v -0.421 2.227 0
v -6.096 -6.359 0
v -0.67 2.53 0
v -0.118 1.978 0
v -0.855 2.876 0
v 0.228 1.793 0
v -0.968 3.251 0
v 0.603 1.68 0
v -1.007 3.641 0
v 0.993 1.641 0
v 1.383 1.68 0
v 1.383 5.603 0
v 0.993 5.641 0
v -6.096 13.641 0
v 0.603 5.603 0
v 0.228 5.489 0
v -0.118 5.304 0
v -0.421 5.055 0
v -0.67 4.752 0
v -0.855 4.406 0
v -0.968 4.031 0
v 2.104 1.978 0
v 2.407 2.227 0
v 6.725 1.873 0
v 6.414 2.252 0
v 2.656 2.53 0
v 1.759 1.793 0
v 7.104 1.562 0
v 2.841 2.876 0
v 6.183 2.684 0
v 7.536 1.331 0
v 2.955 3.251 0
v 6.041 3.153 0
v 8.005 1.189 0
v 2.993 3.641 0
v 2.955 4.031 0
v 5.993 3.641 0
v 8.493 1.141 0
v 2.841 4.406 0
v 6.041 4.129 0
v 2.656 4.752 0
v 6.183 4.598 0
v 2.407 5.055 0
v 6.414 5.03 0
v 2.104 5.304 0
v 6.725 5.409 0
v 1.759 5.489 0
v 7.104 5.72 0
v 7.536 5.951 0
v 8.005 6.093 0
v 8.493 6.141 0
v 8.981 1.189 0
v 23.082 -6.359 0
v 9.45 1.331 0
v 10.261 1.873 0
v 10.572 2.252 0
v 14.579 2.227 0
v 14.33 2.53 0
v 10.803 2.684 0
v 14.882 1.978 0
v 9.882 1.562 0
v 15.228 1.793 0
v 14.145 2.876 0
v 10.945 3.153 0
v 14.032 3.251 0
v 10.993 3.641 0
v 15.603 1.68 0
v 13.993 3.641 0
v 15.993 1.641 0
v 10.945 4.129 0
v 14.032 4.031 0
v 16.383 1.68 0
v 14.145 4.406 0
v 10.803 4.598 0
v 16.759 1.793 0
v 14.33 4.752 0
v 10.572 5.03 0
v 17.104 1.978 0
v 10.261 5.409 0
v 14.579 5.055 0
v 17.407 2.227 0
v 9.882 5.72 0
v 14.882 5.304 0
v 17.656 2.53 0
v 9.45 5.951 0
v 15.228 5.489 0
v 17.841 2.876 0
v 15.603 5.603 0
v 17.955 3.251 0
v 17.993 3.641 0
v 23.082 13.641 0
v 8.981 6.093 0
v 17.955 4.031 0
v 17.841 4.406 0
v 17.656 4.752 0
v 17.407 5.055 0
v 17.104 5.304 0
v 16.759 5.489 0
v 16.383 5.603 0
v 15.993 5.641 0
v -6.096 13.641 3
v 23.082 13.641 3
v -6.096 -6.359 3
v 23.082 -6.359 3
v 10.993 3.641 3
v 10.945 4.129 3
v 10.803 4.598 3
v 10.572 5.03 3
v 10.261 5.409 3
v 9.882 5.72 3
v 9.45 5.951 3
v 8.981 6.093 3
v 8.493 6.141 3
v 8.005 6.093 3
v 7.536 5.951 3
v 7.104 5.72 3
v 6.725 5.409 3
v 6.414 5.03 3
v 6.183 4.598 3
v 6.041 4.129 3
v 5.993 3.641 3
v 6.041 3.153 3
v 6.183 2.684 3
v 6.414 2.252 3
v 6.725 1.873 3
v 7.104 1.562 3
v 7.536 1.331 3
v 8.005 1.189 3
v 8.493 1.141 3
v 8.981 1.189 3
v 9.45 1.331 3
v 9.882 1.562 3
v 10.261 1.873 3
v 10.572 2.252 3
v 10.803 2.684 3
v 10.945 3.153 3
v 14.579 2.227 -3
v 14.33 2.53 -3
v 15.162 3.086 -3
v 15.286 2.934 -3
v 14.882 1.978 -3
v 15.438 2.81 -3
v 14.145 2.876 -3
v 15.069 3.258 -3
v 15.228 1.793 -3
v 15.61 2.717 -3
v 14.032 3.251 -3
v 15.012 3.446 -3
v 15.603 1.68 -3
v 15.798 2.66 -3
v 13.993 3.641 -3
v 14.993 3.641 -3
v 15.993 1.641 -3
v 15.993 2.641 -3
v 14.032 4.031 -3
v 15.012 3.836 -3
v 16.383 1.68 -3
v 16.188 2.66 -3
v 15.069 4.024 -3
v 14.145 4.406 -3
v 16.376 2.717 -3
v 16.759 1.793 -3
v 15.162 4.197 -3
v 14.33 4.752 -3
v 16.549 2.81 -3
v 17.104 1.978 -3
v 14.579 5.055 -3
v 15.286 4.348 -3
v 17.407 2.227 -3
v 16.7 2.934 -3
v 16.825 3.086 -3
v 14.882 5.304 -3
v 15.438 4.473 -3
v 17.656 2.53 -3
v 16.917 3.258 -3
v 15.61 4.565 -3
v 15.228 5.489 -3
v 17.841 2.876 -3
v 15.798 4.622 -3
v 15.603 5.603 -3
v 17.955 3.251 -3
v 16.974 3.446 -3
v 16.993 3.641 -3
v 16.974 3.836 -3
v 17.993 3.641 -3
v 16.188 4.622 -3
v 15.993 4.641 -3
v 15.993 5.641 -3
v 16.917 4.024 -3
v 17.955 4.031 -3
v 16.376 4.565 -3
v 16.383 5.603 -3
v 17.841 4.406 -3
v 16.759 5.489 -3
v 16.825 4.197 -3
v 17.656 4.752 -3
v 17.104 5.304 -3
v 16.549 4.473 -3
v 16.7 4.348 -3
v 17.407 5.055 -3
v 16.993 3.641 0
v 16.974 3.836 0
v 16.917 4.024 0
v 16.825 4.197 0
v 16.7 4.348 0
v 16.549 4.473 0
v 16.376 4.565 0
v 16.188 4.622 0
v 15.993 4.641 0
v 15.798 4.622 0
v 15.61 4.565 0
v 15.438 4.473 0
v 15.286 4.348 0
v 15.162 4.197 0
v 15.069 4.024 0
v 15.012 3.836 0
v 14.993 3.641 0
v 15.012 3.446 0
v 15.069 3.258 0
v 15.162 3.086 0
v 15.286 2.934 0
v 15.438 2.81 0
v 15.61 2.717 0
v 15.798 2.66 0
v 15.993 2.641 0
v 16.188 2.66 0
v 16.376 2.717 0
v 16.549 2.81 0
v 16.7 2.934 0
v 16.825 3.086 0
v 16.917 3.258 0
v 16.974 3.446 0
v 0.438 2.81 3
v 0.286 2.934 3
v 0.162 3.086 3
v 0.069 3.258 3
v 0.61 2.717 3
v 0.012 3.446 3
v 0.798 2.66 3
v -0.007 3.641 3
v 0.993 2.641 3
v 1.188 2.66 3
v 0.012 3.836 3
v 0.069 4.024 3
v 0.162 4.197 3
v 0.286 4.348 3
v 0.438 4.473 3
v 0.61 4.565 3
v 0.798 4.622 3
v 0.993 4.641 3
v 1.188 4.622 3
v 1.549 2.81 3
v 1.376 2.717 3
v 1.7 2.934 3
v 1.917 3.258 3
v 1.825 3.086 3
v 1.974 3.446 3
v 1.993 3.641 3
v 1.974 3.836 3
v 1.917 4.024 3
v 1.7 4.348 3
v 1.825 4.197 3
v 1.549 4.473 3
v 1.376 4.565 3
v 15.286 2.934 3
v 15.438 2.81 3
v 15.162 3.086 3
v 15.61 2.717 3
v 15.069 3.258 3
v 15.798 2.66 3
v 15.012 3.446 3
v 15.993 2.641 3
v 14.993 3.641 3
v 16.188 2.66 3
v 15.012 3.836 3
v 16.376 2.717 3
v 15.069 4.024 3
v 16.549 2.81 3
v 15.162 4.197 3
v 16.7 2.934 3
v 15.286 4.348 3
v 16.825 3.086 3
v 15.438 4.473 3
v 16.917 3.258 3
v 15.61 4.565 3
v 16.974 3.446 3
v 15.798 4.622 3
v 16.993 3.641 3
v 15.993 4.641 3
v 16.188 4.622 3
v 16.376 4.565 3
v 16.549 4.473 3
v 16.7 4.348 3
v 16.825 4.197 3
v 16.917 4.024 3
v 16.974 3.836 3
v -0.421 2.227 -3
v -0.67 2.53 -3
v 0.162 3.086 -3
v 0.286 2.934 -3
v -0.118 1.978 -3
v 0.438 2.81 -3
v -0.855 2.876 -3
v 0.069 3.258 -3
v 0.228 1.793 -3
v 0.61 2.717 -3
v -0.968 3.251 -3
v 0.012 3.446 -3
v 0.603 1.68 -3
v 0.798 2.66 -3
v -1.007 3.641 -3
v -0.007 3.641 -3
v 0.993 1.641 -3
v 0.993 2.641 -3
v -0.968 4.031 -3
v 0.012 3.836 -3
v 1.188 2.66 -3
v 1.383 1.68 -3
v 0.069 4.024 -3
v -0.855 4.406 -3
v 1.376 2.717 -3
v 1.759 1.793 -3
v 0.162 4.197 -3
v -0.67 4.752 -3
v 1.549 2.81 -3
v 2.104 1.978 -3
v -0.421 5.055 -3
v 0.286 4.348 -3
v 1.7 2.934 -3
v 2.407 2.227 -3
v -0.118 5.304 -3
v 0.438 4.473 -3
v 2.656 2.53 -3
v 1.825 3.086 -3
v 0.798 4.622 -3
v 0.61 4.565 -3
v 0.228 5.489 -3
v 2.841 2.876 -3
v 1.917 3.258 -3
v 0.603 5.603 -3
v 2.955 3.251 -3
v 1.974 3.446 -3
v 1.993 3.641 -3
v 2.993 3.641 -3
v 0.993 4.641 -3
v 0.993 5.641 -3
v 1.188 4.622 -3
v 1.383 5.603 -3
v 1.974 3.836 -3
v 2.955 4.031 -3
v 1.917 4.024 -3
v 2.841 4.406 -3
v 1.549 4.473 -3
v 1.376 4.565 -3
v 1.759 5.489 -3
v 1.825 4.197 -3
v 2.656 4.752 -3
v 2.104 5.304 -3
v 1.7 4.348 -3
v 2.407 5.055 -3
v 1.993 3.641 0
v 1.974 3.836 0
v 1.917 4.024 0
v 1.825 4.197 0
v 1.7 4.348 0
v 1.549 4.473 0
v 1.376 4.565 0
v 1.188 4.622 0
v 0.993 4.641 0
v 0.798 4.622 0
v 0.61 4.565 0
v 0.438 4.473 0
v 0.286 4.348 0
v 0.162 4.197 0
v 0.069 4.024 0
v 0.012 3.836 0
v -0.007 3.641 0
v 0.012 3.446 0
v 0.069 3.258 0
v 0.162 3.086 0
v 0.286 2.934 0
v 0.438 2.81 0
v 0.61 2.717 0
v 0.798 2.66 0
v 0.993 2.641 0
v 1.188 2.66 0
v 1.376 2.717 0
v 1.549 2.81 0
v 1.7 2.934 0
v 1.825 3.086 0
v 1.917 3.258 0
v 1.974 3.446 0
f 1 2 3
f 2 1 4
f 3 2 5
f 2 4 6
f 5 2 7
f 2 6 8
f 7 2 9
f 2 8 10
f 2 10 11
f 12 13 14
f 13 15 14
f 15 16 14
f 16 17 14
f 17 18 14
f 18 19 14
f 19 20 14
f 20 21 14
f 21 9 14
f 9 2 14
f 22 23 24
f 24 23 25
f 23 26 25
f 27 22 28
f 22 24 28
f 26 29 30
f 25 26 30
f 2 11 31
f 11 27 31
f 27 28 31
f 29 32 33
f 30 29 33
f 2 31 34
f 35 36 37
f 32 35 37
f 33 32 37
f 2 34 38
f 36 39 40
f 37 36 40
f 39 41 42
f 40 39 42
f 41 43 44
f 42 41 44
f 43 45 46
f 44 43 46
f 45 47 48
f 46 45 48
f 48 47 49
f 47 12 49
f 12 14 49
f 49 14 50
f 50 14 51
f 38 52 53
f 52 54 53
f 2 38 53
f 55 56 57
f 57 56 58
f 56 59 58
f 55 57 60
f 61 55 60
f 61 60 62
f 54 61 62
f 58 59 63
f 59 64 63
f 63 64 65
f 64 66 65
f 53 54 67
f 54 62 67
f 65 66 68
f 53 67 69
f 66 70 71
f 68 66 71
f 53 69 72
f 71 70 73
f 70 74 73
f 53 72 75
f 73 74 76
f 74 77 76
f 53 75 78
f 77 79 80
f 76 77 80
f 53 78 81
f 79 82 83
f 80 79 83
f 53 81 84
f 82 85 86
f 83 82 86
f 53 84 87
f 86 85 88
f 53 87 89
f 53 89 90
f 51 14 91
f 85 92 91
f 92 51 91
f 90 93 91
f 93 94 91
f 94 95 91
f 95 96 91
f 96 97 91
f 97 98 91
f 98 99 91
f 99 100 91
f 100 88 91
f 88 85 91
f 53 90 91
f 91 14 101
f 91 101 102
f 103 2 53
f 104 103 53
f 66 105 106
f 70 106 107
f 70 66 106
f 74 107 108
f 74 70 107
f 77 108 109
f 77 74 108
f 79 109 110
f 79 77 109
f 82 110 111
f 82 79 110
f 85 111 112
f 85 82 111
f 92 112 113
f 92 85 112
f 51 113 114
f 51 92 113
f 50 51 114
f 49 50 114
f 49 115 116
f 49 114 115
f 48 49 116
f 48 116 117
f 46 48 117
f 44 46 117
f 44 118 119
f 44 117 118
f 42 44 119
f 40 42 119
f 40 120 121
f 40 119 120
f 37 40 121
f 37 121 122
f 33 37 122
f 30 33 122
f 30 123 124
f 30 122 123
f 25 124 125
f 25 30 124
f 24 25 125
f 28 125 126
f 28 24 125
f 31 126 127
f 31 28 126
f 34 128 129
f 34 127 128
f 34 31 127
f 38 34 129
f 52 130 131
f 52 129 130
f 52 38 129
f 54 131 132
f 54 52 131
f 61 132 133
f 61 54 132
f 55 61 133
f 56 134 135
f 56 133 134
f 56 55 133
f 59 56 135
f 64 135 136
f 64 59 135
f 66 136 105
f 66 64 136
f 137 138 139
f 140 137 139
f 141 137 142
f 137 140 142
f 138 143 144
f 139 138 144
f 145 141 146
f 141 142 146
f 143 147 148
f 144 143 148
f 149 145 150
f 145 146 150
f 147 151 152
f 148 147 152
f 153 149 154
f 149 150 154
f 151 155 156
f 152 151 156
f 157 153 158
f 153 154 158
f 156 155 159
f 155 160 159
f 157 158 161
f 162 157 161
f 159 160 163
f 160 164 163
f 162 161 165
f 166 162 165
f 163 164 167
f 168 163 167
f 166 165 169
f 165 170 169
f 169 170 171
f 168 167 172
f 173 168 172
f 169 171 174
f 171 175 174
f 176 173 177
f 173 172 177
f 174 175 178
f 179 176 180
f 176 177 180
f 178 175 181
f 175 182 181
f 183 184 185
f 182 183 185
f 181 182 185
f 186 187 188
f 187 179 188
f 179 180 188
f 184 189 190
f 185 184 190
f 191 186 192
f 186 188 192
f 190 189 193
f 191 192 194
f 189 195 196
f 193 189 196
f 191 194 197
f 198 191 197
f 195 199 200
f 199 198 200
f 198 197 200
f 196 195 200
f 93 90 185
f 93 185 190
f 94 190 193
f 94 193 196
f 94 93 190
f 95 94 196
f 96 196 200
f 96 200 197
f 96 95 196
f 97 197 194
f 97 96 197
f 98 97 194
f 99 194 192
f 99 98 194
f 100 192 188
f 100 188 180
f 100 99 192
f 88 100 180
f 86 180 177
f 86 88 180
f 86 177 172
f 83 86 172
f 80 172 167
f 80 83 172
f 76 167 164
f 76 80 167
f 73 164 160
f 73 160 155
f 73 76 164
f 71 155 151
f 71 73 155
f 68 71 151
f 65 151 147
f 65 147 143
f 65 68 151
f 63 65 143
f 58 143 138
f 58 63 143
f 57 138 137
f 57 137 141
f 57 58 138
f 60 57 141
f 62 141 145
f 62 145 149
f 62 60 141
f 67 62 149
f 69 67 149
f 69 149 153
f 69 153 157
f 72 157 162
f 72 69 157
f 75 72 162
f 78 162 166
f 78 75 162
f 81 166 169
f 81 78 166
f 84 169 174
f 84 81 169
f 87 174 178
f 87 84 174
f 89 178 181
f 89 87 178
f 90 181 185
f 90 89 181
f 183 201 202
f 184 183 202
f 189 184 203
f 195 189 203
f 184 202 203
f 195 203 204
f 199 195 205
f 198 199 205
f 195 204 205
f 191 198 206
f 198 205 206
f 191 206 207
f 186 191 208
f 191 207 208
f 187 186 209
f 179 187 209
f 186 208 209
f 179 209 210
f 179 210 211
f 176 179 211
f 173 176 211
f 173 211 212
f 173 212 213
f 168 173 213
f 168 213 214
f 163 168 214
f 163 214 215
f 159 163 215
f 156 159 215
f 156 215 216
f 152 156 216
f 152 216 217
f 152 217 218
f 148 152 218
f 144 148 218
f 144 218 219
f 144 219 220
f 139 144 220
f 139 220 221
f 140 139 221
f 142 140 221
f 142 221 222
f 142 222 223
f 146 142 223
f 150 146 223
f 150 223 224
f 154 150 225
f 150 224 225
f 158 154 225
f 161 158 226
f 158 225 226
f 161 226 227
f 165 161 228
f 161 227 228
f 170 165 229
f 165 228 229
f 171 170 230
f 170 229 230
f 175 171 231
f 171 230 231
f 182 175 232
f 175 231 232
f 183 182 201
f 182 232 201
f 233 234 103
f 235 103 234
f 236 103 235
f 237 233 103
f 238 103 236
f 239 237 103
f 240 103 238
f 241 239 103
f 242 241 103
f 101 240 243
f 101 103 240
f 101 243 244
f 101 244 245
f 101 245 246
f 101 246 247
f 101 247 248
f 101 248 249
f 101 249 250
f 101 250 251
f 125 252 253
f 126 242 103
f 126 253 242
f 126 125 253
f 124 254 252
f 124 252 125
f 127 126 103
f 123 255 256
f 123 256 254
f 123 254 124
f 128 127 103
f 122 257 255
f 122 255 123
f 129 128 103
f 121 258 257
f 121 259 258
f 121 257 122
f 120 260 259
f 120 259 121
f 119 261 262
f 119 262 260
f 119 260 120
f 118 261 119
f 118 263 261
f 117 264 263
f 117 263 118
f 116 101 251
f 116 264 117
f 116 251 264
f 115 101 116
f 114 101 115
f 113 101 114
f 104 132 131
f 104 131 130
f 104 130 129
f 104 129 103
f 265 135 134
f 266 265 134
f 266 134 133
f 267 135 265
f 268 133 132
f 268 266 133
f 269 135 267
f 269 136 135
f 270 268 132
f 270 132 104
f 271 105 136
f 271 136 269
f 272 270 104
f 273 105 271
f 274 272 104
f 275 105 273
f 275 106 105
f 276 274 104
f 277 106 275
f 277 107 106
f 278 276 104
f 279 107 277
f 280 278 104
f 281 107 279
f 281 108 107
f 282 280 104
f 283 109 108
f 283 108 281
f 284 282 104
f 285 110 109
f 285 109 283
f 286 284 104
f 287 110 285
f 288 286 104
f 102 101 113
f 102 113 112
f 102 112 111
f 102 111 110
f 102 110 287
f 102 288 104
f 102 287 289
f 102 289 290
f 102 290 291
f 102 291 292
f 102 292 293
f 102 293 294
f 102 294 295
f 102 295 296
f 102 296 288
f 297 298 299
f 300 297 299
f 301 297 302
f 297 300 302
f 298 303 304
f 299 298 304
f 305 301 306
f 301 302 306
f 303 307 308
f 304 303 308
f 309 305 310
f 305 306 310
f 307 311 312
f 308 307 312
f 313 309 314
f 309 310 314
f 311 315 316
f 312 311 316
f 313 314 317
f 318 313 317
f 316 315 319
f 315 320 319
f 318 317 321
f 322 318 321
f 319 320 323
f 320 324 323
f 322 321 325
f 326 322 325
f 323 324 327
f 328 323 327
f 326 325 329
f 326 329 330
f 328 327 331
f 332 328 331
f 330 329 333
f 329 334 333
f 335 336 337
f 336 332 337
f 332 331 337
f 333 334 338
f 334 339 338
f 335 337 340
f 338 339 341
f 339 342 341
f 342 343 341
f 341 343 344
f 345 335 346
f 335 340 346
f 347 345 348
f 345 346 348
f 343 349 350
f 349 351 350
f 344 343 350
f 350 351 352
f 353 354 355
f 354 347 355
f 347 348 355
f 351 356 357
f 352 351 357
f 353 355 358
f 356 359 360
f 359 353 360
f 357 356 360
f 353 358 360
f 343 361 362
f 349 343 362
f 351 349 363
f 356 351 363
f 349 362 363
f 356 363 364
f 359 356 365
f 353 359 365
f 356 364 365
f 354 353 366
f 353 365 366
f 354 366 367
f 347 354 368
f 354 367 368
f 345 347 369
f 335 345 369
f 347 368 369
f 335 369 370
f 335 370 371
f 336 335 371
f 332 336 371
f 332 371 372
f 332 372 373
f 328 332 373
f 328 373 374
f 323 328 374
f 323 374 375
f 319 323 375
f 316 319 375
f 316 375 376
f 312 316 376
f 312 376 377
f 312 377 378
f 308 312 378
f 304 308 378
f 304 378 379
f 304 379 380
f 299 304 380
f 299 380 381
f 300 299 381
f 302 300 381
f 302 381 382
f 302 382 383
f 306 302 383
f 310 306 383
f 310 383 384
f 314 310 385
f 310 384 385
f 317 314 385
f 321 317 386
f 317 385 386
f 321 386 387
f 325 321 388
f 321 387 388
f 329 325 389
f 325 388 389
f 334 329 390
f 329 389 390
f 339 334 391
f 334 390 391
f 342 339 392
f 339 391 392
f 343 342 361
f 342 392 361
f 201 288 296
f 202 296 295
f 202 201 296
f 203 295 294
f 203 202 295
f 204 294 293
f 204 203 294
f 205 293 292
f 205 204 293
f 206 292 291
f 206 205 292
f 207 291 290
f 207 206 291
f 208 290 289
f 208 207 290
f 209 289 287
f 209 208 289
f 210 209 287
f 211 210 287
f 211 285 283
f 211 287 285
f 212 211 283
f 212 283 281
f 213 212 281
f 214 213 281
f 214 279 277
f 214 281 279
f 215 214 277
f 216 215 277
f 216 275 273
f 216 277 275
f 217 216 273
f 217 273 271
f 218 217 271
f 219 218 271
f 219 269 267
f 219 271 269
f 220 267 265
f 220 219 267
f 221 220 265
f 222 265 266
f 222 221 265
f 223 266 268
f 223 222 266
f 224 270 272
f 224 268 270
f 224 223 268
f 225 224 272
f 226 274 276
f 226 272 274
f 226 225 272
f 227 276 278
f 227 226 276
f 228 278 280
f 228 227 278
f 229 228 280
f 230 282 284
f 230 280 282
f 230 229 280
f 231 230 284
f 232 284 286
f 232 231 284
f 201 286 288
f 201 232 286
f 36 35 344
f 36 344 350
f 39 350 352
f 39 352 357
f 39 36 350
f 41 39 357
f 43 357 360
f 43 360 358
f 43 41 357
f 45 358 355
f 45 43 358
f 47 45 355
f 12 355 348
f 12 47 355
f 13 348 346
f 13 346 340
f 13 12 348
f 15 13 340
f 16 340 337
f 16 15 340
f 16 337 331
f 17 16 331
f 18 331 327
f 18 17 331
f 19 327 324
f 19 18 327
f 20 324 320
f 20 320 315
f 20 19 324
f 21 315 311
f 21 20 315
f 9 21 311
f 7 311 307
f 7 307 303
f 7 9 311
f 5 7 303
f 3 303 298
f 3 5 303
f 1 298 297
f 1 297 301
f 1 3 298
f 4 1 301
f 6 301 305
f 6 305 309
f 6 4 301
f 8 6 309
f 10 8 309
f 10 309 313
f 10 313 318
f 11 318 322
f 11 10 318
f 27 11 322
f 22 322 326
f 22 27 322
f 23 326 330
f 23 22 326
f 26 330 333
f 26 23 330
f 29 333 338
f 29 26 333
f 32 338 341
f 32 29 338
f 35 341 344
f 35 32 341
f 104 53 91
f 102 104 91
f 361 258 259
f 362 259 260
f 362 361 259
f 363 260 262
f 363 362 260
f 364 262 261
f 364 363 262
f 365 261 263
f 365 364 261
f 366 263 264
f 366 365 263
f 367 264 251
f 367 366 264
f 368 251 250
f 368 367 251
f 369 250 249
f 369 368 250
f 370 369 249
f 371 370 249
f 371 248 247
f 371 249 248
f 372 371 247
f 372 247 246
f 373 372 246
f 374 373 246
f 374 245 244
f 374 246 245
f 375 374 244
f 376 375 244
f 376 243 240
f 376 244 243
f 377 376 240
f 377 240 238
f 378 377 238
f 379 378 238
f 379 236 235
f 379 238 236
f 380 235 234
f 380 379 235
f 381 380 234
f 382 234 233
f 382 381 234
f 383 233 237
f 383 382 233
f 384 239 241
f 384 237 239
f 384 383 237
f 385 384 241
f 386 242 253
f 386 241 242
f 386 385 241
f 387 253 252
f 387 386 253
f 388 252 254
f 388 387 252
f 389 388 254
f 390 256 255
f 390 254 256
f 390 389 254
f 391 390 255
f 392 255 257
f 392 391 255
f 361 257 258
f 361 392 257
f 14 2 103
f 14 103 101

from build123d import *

# Parameters (mm, degrees)
SKETCH_1_W              = 29.177684157
SKETCH_1_H              = 20
EXTRUDE_1_DEPTH         = 3
SKETCH2_R               = 2
BOSS_EXTRUDE3_DEPTH     = 3
SKETCH_2_R              = 2.5
SKETCH_2_R_2            = 1
CUT_EXTRUDE1_DEPTH      = 10
CUT_EXTRUDE1_DEPTH_BACK = 6


with BuildPart() as part:
    # 草圖1 → 填料-伸長1 (new body)
    with BuildSketch(Plane.XY):
        with Locations((8.493155936, 3.641078838)):
            Rectangle(SKETCH_1_W, SKETCH_1_H)
    extrude(amount=EXTRUDE_1_DEPTH)

    # Sketch2 → Boss-Extrude3 (add)
    with BuildSketch(Plane.XY):
        with Locations((15.993155937, 3.641078838)):
            Circle(SKETCH2_R)
        with Locations((0.993155937, 3.641078838)):
            Circle(SKETCH2_R)
    extrude(amount=-BOSS_EXTRUDE3_DEPTH)

    # 草圖2 → Cut-Extrude1 (cut, two sides)
    with BuildSketch(Plane.XY) as cut_extrude1_sk:
        with Locations((8.493155937, 3.641078838)):
            Circle(SKETCH_2_R)
        with Locations((15.993155937, 3.641078838)):
            Circle(SKETCH_2_R_2)
        with Locations((0.993155937, 3.641078838)):
            Circle(SKETCH_2_R_2)
    extrude(amount=CUT_EXTRUDE1_DEPTH, mode=Mode.SUBTRACT)
    extrude(cut_extrude1_sk.sketch, amount=-CUT_EXTRUDE1_DEPTH_BACK, mode=Mode.SUBTRACT)


solid = part.part
